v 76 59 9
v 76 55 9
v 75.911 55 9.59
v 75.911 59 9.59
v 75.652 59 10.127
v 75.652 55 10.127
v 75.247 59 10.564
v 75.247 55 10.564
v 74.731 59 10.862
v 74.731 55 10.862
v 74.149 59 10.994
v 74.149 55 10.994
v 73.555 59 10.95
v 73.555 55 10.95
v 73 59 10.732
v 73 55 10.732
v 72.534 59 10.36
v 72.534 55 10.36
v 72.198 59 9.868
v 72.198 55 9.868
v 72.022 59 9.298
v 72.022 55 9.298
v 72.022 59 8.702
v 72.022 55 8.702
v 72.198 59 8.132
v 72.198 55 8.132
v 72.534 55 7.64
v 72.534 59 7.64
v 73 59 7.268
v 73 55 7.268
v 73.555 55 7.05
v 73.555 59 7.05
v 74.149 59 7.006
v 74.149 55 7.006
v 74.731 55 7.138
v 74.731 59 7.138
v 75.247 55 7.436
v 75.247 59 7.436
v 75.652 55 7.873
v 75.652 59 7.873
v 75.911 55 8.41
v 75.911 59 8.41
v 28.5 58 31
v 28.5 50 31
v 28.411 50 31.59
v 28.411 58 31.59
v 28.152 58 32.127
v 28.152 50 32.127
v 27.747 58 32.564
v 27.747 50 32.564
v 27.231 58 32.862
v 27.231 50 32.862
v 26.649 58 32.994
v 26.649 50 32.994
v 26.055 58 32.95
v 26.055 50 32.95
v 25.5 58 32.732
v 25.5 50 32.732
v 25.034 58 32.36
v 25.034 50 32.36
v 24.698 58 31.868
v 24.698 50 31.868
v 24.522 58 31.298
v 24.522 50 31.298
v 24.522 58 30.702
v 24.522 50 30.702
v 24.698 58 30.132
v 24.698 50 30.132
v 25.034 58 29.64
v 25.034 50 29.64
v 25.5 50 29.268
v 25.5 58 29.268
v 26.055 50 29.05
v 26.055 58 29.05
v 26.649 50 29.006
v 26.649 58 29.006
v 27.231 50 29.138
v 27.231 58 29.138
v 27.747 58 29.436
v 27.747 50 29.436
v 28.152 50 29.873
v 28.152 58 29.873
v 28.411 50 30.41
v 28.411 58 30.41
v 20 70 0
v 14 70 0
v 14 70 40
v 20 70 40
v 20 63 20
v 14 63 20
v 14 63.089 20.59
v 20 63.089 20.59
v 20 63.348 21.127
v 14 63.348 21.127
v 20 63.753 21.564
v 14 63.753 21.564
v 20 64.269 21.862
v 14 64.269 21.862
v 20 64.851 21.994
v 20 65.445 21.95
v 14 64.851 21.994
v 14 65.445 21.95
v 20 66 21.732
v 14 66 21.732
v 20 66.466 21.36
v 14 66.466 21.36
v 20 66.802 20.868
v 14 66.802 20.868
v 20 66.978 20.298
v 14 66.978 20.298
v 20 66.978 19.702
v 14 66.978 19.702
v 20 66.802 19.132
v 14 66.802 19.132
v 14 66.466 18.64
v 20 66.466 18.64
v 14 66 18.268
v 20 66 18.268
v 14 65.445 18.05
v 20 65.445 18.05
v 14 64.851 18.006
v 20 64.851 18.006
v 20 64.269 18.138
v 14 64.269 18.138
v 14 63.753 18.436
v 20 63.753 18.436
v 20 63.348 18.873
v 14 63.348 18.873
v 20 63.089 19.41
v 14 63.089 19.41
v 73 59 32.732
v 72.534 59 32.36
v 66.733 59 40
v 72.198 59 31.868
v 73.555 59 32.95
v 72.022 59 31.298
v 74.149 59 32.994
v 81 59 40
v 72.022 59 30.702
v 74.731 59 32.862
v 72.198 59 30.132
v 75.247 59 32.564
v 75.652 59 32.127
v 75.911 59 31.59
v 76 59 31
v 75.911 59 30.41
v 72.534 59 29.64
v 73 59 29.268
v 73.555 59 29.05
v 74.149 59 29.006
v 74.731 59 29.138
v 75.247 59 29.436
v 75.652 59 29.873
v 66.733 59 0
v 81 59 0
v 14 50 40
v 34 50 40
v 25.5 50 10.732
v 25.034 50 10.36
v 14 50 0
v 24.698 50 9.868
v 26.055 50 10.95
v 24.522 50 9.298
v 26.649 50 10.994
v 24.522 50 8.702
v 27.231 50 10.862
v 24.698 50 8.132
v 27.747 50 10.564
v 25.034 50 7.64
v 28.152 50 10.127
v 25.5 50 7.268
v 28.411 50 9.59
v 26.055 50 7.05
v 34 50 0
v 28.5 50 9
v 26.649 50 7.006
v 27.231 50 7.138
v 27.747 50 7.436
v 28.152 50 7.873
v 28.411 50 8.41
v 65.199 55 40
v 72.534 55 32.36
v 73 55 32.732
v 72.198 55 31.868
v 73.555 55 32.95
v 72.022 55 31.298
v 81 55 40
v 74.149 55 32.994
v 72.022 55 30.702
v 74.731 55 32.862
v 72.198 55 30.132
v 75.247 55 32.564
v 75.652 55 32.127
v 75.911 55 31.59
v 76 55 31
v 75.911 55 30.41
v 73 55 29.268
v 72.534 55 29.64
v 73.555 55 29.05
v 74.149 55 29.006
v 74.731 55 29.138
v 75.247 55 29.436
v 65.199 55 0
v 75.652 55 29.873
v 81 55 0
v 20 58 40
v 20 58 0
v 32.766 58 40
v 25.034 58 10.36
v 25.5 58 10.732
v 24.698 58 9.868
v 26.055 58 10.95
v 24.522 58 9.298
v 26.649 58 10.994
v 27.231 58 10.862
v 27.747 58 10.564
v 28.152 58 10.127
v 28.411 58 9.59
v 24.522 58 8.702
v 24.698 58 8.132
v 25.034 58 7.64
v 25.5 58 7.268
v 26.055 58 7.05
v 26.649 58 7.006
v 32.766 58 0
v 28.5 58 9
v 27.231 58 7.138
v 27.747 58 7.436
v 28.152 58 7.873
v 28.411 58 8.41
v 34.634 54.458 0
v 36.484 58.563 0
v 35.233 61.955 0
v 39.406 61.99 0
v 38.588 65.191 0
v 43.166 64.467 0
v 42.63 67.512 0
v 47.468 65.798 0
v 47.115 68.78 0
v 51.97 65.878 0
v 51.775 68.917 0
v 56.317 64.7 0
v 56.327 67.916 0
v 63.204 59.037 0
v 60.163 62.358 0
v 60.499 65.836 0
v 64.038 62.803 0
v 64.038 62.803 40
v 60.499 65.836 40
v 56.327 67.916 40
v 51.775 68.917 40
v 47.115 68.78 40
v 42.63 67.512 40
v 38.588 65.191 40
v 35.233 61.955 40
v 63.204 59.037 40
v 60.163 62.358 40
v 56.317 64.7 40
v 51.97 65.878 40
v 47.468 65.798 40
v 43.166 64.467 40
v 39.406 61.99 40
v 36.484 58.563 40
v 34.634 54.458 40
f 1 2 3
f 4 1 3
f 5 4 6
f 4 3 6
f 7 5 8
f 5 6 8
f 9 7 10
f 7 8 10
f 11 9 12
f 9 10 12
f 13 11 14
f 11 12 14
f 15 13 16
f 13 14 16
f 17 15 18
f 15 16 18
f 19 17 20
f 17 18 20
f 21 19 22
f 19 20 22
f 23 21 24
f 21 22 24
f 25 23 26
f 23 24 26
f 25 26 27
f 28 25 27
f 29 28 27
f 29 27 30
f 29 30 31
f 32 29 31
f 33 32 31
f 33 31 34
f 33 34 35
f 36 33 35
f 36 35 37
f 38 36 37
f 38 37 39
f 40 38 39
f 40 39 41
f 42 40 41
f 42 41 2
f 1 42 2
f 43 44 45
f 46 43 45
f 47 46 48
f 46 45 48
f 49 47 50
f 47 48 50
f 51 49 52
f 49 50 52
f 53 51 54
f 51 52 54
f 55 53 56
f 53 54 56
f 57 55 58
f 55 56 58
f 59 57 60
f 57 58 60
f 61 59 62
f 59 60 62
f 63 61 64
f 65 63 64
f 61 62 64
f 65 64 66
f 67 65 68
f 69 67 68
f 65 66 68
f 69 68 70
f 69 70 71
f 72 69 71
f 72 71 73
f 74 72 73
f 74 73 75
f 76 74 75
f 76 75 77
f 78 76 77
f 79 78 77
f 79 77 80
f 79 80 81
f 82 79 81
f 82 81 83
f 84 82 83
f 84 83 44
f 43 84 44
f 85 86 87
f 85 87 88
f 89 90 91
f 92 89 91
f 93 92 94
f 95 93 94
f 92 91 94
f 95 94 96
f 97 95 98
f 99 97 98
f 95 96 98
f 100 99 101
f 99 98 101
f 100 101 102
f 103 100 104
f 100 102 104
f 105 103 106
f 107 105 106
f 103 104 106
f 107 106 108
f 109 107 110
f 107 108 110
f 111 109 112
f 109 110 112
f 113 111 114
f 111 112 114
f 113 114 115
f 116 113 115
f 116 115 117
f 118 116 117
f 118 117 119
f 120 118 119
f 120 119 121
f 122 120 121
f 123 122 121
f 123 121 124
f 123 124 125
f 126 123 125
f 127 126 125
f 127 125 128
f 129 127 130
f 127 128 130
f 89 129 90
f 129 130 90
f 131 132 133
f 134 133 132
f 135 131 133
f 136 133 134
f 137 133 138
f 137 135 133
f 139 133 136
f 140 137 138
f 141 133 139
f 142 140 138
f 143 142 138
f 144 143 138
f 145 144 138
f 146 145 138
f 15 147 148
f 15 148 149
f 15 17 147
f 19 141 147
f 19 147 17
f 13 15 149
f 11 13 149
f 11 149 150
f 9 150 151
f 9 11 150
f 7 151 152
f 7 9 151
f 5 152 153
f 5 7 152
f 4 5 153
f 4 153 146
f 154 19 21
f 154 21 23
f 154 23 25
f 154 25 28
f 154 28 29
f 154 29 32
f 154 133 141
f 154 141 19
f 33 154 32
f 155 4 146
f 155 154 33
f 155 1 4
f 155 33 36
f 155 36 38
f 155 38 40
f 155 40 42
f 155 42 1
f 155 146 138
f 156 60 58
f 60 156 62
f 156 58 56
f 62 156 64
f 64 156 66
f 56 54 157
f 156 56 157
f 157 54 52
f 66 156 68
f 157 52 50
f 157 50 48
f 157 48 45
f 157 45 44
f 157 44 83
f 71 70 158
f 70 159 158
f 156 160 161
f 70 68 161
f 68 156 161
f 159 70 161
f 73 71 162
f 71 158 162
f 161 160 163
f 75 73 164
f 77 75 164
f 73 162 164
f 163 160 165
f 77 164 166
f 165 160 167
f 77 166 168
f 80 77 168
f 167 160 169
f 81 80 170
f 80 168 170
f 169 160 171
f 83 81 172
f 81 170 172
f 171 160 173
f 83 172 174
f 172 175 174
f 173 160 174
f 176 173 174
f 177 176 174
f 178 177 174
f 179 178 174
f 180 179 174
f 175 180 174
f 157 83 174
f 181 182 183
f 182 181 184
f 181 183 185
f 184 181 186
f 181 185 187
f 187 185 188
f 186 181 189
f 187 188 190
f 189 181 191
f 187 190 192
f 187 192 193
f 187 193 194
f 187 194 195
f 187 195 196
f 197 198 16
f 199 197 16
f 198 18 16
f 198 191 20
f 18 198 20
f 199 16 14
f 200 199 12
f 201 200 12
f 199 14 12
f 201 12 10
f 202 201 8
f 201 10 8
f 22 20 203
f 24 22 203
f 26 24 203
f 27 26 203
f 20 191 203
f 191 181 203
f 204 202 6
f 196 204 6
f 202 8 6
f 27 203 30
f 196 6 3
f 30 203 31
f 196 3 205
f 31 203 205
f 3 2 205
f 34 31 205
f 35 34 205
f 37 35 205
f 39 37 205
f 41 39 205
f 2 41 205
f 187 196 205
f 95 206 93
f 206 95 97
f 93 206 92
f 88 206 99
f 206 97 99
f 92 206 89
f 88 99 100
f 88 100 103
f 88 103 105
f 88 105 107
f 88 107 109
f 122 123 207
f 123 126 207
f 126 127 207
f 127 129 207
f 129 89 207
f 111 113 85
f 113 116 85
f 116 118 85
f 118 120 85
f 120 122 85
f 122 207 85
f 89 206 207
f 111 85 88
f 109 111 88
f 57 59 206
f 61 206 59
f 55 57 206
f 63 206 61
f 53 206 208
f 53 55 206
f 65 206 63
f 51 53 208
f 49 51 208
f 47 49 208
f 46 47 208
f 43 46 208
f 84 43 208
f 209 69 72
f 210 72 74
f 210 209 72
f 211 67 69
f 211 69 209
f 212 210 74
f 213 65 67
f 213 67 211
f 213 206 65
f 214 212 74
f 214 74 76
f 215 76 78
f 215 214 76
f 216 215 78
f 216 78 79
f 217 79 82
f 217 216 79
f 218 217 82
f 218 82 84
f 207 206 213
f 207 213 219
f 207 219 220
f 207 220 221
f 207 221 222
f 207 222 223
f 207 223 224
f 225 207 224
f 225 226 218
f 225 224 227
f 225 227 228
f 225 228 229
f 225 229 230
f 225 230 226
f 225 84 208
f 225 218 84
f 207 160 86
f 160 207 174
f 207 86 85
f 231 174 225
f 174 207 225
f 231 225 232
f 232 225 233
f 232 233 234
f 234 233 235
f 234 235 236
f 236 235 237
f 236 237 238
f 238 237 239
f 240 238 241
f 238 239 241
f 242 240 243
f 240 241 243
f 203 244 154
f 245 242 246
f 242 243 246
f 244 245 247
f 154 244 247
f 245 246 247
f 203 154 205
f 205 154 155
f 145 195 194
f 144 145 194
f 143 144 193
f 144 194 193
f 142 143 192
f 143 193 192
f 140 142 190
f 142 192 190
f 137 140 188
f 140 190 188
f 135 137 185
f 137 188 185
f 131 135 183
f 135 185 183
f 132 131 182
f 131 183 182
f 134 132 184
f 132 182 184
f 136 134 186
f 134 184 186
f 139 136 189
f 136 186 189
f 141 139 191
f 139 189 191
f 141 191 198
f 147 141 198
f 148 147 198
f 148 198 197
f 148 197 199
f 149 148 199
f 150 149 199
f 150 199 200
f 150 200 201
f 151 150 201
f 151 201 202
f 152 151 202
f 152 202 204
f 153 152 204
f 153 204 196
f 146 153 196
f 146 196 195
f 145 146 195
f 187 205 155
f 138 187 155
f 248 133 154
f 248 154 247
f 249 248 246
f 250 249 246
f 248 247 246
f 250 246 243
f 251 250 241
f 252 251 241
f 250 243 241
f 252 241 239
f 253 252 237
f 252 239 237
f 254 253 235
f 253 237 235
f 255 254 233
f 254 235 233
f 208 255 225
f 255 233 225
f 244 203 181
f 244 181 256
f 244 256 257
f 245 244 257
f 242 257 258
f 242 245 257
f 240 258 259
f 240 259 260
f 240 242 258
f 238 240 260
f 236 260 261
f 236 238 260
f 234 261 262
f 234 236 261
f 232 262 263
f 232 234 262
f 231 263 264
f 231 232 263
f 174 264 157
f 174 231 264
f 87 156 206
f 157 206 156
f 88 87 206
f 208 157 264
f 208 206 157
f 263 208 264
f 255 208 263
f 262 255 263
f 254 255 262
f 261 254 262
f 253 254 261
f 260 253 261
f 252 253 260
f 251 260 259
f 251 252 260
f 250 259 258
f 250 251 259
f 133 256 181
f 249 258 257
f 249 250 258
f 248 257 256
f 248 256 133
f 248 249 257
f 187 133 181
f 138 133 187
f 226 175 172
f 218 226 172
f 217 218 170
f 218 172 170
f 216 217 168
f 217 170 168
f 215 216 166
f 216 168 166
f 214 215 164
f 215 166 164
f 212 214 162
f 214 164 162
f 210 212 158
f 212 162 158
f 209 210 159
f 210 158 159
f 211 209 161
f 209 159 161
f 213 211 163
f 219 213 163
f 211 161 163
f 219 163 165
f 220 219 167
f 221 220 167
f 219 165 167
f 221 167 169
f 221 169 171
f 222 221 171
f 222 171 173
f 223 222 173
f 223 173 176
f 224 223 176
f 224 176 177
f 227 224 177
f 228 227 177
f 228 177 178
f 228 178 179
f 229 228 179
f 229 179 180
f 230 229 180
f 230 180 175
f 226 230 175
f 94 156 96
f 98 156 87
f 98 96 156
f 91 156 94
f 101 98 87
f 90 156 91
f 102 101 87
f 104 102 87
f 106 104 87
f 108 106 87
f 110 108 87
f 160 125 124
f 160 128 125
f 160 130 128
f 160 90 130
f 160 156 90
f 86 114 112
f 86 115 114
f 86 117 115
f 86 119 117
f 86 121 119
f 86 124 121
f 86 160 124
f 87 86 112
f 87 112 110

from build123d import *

# Parameters (mm, degrees)
SKETCH209_R     = 19
SKETCH209_R_2   = 16
PAD104_DEPTH    = 40
SKETCH210_W     = 38
SKETCH210_H     = 10
POCKET121_DEPTH = 40
SKETCH211_W     = 15
SKETCH211_H     = 4
PAD105_DEPTH    = 40
SKETCH212_R     = 2
POCKET122_DEPTH = 69.001
SKETCH213_W     = 6
SKETCH213_H     = 40
SKETCH213_W_2   = 13
SKETCH213_H_2   = 16
PAD106_DEPTH    = 40
SKETCH214_R     = 2
POCKET123_DEPTH = 6
SKETCH_W        = 90
SKETCH_H        = 30
POCKET_DEPTH    = 40.001
SKETCH215_R     = 2
POCKET124_DEPTH = 70.001


with BuildPart() as part:
    # Sketch209 → Pad104 (new body)
    with BuildSketch(Plane.XY):
        with Locations((50, 50)):
            Circle(SKETCH209_R)
        with Locations((50, 50)):
            Circle(SKETCH209_R_2, mode=Mode.SUBTRACT)
    extrude(amount=PAD104_DEPTH)

    # Sketch210 → Pocket121 (cut)
    with BuildSketch(Plane.XY):
        with Locations((69, 50)):
            Rectangle(SKETCH210_W, SKETCH210_H)
    extrude(amount=POCKET121_DEPTH, mode=Mode.SUBTRACT)

    # Sketch211 → Pad105 (join)
    with BuildSketch(Plane.XY):
        with Locations((73.5, 57)):
            Rectangle(SKETCH211_W, SKETCH211_H)
        with Locations((73.5, 43)):
            Rectangle(SKETCH211_W, SKETCH211_H)
    extrude(amount=PAD105_DEPTH)

    # Sketch212 → Pocket122 (cut, through all)
    with BuildSketch(Plane.XZ):
        with Locations((74, 31)):
            Circle(SKETCH212_R)
        with Locations((74, 9)):
            Circle(SKETCH212_R)
    extrude(amount=-POCKET122_DEPTH, mode=Mode.SUBTRACT)

    # Sketch213 → Pad106 (join)
    with BuildSketch(Plane.XY):
        with Locations((17, 50)):
            Rectangle(SKETCH213_W, SKETCH213_H)
        with Locations((26.5, 50)):
            Rectangle(SKETCH213_W_2, SKETCH213_H_2)
    extrude(amount=PAD106_DEPTH)

    # Sketch214 (on Face19 of Pad106) → Pocket123 (cut)
    with BuildSketch(Plane(origin=(14, 0, 0), x_dir=(0, -1, 0), z_dir=(-1, 0, 0))):
        with Locations((-65, 20)):
            Circle(SKETCH214_R)
        with Locations((-35, 20)):
            Circle(SKETCH214_R)
    extrude(amount=-POCKET123_DEPTH, mode=Mode.SUBTRACT)

    # Sketch → Pocket (cut, through all)
    with BuildSketch(Plane.XY):
        with Locations((48.284056, 35)):
            Rectangle(SKETCH_W, SKETCH_H)
    extrude(amount=POCKET_DEPTH, mode=Mode.SUBTRACT)

    # Sketch215 → Pocket124 (cut, through all)
    with BuildSketch(Plane.XZ):
        with Locations((26.5, 31)):
            Circle(SKETCH215_R)
        with Locations((26.5, 9)):
            Circle(SKETCH215_R)
    extrude(amount=-POCKET124_DEPTH, mode=Mode.SUBTRACT)


solid = part.part
